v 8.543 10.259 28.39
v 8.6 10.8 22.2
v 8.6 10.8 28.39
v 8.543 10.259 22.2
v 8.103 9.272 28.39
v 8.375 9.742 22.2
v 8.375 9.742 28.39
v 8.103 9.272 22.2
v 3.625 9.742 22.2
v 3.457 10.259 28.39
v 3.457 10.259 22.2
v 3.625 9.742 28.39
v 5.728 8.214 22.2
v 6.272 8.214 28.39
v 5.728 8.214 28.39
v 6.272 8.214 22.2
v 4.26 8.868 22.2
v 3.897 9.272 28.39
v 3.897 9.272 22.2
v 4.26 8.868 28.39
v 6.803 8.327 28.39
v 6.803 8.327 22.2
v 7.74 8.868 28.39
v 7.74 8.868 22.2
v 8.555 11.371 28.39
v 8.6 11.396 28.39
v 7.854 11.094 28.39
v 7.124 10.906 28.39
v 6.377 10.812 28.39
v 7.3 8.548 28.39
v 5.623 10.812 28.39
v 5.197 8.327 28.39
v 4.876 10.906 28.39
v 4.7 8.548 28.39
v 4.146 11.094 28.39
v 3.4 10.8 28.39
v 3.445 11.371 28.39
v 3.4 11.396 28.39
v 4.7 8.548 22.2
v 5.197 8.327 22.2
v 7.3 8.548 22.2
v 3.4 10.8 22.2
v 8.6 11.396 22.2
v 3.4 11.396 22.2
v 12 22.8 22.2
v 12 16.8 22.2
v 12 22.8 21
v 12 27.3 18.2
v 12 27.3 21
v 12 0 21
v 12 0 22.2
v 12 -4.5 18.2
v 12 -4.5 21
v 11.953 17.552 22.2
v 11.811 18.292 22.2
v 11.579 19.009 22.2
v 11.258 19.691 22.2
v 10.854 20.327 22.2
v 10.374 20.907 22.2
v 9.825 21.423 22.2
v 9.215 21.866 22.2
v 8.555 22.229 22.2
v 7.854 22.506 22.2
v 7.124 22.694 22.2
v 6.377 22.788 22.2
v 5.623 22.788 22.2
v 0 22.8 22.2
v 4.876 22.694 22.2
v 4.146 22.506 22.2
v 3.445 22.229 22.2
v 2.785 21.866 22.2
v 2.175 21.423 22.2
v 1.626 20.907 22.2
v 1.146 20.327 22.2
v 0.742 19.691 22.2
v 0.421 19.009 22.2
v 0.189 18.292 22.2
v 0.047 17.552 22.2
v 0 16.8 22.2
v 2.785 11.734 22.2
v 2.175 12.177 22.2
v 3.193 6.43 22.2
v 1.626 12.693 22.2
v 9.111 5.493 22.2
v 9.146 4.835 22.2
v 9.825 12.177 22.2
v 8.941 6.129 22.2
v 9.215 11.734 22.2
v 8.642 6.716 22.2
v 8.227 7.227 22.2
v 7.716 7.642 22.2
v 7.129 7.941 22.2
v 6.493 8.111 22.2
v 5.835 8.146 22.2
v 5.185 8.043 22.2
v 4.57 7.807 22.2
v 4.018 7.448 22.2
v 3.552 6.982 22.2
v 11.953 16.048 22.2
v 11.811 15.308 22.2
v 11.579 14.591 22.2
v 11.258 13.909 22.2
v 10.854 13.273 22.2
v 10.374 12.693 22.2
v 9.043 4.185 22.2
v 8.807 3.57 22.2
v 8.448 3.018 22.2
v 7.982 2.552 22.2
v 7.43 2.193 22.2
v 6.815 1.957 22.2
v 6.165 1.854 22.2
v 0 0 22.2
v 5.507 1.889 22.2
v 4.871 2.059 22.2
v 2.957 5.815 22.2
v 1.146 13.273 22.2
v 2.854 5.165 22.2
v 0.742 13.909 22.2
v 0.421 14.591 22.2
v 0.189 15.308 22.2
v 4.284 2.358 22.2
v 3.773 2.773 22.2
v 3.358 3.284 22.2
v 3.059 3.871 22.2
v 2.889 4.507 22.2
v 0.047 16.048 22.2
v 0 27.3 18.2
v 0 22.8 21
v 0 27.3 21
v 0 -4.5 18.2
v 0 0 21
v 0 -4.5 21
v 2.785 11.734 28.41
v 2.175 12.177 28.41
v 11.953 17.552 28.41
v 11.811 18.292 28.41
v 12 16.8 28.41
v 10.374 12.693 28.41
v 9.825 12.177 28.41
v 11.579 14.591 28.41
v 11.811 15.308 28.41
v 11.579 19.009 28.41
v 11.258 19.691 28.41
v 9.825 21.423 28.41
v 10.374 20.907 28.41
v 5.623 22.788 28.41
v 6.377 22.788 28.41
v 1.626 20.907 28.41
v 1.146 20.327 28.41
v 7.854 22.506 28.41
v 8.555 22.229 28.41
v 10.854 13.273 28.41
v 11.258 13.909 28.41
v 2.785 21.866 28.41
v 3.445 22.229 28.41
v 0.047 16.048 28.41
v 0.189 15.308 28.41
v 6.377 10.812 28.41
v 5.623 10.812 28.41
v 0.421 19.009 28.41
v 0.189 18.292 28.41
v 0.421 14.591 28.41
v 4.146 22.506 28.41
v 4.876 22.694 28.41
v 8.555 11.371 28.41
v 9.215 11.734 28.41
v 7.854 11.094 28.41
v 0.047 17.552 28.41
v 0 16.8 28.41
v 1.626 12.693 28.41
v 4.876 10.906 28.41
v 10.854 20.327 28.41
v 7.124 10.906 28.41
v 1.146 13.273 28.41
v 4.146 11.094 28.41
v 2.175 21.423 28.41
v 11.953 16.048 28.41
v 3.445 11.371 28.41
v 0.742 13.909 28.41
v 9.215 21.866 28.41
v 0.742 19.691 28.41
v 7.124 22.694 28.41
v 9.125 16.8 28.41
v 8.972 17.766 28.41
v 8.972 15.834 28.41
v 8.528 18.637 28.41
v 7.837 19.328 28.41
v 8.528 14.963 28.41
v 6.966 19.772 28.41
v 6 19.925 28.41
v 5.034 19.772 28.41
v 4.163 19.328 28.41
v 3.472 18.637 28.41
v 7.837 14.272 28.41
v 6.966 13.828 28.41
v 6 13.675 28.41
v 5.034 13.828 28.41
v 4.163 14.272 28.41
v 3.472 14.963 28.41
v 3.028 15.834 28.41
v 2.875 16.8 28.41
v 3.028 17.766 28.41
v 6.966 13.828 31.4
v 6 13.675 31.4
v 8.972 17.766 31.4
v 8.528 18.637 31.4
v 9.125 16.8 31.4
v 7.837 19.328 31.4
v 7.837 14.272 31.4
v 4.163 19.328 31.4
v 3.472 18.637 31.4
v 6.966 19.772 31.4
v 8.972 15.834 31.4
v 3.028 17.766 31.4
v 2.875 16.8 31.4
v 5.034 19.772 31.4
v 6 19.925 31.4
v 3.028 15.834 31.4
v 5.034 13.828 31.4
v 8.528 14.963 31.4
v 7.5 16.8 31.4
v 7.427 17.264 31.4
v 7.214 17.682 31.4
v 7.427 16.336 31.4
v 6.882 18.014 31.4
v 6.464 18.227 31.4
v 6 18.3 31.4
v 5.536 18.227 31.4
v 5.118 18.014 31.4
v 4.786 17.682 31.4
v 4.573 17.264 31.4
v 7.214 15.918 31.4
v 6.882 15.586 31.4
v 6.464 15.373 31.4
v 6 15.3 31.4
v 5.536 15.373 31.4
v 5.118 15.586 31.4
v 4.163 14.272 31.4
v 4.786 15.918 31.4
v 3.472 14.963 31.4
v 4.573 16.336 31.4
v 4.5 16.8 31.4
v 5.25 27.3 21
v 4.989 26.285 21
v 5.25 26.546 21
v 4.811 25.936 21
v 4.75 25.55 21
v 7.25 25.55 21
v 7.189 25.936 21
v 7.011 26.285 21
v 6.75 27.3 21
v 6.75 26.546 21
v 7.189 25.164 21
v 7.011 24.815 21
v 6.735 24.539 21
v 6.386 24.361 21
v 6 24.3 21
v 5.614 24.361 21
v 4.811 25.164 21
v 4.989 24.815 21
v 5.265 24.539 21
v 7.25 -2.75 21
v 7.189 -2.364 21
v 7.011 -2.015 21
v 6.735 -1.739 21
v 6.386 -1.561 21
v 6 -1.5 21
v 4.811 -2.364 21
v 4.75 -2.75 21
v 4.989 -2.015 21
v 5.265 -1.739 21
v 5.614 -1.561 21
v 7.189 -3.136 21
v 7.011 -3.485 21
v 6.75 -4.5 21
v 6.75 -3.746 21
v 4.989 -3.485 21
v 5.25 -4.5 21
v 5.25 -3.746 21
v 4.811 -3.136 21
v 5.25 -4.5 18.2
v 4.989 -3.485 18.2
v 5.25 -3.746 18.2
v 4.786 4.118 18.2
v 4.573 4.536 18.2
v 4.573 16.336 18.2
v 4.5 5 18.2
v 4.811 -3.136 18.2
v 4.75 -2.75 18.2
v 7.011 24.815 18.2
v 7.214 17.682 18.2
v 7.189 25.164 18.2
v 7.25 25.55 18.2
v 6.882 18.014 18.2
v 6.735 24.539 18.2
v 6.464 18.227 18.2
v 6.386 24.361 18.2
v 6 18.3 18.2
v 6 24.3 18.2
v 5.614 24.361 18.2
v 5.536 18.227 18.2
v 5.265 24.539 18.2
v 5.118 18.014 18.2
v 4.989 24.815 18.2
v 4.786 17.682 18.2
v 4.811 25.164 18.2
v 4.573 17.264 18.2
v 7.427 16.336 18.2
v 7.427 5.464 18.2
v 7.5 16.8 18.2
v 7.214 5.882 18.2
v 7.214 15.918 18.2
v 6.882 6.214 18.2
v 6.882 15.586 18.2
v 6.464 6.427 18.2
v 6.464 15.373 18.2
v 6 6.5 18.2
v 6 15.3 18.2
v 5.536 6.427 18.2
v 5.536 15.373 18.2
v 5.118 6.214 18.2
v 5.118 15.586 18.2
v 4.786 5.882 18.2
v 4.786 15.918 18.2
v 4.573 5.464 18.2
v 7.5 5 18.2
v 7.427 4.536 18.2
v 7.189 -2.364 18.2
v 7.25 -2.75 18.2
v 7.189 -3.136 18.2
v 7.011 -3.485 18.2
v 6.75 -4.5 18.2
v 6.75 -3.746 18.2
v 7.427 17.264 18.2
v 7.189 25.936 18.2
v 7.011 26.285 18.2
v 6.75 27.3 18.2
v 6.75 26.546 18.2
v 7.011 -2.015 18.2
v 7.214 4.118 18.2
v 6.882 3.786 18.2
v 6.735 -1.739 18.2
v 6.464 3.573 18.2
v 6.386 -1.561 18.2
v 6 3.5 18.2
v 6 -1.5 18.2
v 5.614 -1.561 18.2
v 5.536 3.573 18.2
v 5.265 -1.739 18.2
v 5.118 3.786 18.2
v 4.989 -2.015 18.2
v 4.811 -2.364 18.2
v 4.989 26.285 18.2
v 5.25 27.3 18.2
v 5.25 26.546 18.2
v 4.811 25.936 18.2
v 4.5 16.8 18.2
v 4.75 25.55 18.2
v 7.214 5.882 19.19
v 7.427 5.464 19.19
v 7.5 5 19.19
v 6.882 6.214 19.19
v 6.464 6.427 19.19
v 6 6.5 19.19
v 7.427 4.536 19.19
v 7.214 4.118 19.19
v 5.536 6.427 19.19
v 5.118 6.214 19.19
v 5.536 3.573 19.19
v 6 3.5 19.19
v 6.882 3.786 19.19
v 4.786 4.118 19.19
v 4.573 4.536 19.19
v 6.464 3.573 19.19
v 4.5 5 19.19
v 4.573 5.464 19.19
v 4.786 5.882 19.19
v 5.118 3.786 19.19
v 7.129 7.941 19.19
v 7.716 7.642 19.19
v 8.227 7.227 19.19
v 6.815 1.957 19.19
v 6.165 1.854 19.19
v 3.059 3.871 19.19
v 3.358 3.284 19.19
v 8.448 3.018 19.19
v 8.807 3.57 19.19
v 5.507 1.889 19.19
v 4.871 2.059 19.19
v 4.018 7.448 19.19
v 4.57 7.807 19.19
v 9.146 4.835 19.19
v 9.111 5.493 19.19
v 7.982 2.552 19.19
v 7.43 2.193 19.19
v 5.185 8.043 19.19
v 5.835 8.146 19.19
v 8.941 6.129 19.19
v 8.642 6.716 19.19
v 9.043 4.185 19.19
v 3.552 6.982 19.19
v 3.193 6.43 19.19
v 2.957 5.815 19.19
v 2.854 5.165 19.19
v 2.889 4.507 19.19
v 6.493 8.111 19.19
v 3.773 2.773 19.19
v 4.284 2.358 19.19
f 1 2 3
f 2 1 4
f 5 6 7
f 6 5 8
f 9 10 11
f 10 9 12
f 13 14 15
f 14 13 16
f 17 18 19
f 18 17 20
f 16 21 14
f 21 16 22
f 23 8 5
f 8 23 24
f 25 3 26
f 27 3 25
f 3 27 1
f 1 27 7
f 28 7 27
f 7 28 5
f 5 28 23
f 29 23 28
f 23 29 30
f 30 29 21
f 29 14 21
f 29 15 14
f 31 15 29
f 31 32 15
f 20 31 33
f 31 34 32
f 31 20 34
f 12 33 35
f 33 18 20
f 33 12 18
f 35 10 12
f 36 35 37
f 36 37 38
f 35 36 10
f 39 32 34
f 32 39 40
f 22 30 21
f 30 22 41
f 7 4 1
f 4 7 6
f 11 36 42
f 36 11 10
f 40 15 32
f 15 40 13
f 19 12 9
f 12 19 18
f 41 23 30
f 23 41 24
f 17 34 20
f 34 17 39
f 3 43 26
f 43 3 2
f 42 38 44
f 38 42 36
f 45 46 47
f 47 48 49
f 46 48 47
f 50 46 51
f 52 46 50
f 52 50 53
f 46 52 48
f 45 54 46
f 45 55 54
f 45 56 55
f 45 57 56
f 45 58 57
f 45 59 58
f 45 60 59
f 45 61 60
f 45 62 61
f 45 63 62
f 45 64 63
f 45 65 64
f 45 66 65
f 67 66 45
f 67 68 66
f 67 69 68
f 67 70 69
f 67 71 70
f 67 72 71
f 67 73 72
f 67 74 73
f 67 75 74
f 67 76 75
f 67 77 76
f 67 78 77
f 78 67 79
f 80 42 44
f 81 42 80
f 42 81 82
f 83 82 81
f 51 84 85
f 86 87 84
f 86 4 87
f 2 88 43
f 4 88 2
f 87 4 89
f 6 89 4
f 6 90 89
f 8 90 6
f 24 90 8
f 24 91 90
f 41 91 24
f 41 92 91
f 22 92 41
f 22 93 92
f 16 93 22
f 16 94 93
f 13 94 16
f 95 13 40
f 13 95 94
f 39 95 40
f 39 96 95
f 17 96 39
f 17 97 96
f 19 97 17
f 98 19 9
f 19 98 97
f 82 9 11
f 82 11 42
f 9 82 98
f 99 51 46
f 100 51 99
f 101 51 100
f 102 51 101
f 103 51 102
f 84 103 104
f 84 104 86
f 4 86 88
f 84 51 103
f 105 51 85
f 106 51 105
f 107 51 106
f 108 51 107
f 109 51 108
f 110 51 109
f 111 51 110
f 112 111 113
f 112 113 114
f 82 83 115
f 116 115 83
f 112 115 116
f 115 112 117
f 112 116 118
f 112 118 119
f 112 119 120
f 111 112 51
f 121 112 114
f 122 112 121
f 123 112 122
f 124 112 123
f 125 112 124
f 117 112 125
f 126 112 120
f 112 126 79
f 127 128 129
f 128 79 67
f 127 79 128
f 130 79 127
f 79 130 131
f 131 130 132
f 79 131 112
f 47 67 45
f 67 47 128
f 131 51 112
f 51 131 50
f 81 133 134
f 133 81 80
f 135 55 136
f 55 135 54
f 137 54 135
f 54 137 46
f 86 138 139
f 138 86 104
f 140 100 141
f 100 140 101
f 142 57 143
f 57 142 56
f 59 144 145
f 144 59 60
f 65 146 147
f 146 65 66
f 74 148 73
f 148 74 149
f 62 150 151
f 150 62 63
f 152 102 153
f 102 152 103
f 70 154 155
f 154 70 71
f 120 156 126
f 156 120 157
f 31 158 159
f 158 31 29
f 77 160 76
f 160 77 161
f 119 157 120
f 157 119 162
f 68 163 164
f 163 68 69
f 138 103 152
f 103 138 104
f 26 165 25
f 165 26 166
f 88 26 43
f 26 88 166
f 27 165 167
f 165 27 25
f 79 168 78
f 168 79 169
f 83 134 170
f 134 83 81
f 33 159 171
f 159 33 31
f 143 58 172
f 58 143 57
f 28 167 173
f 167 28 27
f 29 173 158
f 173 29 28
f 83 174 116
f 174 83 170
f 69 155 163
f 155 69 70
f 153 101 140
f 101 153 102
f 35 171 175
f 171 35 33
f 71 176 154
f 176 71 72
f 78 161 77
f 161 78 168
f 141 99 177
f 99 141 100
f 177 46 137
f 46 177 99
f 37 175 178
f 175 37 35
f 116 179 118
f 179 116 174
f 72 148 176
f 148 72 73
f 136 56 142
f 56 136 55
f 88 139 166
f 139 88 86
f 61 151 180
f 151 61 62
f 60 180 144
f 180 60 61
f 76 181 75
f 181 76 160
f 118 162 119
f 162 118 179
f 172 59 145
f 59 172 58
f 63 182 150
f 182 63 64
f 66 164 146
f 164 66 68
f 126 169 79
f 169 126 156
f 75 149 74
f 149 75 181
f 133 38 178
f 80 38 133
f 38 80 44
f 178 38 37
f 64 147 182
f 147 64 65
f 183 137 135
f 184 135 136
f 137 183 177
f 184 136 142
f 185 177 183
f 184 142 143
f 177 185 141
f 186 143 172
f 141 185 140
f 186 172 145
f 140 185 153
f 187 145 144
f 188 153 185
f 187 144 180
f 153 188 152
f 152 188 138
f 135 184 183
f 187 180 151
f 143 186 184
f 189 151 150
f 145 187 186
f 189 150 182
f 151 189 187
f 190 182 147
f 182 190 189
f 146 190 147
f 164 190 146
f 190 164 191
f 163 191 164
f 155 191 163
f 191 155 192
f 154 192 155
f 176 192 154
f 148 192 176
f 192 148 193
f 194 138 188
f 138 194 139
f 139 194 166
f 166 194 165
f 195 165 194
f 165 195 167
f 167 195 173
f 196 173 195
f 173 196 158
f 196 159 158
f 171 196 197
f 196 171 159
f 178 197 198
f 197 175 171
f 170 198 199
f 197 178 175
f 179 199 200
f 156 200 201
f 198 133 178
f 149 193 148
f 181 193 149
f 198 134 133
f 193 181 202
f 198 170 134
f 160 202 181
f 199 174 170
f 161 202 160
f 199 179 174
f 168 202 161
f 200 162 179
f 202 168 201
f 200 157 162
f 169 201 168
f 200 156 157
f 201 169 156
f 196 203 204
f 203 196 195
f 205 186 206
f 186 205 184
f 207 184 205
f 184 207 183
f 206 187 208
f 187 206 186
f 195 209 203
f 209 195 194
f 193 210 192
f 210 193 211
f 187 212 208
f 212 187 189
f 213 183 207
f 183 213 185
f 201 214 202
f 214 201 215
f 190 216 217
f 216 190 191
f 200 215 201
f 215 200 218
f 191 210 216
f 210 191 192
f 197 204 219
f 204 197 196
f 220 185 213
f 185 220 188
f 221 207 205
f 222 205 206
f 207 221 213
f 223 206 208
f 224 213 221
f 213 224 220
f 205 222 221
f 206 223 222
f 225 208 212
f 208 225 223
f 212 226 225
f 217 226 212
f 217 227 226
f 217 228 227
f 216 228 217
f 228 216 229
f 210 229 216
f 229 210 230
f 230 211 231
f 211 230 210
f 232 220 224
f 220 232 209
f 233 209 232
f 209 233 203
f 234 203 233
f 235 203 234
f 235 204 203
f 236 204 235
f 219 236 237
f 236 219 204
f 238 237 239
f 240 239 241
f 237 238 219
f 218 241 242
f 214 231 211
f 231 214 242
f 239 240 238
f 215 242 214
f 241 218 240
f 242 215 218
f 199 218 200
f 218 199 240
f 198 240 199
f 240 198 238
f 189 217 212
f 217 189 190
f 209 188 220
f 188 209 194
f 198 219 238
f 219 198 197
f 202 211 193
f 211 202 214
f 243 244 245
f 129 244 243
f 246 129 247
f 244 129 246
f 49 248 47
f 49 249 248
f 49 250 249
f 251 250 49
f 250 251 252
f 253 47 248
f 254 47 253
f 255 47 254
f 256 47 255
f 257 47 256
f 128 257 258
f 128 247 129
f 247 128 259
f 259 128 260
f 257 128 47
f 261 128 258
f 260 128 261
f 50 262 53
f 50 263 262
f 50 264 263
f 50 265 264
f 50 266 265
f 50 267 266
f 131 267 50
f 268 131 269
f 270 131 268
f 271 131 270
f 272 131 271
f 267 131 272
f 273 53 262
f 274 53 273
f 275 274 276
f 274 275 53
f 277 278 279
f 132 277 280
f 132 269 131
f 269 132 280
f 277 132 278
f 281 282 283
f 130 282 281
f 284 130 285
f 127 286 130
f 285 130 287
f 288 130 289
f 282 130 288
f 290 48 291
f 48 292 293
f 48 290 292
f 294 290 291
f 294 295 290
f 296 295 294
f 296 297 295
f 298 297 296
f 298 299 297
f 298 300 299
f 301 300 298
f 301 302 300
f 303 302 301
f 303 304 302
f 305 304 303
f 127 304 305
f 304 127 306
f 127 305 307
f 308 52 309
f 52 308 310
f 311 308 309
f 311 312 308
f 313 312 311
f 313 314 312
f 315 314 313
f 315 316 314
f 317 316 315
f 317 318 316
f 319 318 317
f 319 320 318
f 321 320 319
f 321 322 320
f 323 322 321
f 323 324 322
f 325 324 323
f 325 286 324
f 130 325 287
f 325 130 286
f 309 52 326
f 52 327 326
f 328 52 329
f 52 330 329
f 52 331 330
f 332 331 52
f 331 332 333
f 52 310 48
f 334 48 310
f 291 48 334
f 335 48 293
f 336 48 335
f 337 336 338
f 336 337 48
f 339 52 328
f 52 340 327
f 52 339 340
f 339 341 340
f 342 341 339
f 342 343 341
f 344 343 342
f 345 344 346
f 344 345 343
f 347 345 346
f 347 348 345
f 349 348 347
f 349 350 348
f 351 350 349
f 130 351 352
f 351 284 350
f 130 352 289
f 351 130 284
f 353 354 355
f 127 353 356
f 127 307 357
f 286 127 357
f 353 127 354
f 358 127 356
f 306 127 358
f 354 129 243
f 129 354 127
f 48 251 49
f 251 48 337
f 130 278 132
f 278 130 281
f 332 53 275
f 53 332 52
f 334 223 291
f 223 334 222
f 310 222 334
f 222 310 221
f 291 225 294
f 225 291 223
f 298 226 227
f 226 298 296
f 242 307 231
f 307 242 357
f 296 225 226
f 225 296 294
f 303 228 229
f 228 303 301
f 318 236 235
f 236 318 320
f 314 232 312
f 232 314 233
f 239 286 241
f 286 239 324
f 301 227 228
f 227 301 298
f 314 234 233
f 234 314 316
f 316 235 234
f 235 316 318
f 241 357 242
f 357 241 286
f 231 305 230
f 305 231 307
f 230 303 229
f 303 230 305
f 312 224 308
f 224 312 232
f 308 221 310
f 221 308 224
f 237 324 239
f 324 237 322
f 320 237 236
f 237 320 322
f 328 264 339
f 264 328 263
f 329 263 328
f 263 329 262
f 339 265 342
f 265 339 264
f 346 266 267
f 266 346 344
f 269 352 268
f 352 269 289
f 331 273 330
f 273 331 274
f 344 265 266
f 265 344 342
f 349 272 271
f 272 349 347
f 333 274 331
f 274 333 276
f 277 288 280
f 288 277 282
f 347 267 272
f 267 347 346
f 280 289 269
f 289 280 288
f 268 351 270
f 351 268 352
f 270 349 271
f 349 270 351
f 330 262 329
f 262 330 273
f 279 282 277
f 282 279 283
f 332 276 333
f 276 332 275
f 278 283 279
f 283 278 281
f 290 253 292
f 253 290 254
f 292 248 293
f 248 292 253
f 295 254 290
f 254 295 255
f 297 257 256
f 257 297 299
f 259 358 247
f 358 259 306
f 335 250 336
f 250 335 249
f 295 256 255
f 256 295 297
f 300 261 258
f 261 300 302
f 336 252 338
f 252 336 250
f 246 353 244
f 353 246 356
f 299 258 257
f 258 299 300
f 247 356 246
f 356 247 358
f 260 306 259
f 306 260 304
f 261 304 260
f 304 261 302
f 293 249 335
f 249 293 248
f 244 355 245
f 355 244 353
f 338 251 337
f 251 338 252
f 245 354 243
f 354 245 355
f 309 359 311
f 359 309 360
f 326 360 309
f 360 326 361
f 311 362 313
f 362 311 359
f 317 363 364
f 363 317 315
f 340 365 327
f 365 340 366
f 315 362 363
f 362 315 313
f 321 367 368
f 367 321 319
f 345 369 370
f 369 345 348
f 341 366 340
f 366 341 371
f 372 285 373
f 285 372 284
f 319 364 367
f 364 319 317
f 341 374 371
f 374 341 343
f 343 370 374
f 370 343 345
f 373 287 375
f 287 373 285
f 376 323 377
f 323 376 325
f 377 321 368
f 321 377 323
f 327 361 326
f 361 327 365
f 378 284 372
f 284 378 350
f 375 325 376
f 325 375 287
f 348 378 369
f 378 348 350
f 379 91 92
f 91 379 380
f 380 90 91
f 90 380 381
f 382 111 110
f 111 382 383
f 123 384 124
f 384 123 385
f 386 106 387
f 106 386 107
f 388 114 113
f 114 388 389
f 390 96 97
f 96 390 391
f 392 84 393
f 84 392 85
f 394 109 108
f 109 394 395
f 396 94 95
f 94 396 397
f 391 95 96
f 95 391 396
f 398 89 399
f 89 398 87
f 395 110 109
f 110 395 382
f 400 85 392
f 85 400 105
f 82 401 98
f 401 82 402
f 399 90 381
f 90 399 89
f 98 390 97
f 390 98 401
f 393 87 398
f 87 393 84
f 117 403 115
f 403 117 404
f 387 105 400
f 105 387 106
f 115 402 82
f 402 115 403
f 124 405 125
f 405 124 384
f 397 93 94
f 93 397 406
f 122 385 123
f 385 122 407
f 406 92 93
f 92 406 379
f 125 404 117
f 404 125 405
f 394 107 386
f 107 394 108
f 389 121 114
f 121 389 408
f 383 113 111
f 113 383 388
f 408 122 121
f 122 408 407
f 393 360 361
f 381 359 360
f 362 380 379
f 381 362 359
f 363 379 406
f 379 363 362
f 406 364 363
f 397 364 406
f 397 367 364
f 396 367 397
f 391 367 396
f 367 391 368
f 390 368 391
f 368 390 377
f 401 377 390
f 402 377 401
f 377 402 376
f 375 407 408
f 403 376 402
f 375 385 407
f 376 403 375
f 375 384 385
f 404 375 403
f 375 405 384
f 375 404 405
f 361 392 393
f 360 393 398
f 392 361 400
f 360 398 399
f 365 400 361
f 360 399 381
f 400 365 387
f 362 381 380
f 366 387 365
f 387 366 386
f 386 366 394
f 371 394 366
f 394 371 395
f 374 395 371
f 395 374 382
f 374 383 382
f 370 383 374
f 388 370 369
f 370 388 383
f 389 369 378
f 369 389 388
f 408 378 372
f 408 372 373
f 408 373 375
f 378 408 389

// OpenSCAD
//rotate([0,90,0])
difference() {
  mg90s(1);
  for(x=[6]) translate([x,5,-.01]) {
    cylinder(d=3,h=22.3,$fn=20);
    cylinder(d=6.4,h=3.4,$fn=30);
    rotate([0,0,45]) translate([0,0,19.2]) cylinder(d=6.3,h=3.2,$fn=30);
  }
  translate([-1,-5,-1]) cube([14,36,19.2]);
}
module mg90s(mod=0) {
  mh=22.8;
  mw=12;
  bd=22.2;
  difference(){
  union(){
  cube([mw,mh,bd]);
  translate([mw/2,mh-mw/2,bd-.01]) cylinder(d=mw,h=6.22,$fn=50);
  translate([mw/2,mh-mw/2,bd+5.98]) cylinder(d=4.25+(mod?2:0),h=3.22,$fn=20);
  translate([mw/2,mh-mw,bd-.01]) {
    cylinder(d=5.2,h=6.2,$fn=30);
    translate([-2.6,0]) cube([5.2,5.2,6.2]);
  }
  translate([0,-4.5,bd-4]) cube([mw,mh+9,2.8]);
  }
  if(mod)
  translate([mw/2,mh-mw/2,-1]) {
    cylinder(d=3,h=34.22,$fn=20);
    rotate([0,0,45]) cylinder(d=8,h=4,$fn=4);
  }
  translate([0,mh/2]) for(m=[0,1]) mirror([0,m]) translate([0,-mh/2]) translate([mw/2,-2.75,bd-4.01]) {
    cylinder(d=2.5,h=4.02,$fn=20);
    translate([-.75,-2]) cube([1.5,2,4.02]);
  }
  }
}
